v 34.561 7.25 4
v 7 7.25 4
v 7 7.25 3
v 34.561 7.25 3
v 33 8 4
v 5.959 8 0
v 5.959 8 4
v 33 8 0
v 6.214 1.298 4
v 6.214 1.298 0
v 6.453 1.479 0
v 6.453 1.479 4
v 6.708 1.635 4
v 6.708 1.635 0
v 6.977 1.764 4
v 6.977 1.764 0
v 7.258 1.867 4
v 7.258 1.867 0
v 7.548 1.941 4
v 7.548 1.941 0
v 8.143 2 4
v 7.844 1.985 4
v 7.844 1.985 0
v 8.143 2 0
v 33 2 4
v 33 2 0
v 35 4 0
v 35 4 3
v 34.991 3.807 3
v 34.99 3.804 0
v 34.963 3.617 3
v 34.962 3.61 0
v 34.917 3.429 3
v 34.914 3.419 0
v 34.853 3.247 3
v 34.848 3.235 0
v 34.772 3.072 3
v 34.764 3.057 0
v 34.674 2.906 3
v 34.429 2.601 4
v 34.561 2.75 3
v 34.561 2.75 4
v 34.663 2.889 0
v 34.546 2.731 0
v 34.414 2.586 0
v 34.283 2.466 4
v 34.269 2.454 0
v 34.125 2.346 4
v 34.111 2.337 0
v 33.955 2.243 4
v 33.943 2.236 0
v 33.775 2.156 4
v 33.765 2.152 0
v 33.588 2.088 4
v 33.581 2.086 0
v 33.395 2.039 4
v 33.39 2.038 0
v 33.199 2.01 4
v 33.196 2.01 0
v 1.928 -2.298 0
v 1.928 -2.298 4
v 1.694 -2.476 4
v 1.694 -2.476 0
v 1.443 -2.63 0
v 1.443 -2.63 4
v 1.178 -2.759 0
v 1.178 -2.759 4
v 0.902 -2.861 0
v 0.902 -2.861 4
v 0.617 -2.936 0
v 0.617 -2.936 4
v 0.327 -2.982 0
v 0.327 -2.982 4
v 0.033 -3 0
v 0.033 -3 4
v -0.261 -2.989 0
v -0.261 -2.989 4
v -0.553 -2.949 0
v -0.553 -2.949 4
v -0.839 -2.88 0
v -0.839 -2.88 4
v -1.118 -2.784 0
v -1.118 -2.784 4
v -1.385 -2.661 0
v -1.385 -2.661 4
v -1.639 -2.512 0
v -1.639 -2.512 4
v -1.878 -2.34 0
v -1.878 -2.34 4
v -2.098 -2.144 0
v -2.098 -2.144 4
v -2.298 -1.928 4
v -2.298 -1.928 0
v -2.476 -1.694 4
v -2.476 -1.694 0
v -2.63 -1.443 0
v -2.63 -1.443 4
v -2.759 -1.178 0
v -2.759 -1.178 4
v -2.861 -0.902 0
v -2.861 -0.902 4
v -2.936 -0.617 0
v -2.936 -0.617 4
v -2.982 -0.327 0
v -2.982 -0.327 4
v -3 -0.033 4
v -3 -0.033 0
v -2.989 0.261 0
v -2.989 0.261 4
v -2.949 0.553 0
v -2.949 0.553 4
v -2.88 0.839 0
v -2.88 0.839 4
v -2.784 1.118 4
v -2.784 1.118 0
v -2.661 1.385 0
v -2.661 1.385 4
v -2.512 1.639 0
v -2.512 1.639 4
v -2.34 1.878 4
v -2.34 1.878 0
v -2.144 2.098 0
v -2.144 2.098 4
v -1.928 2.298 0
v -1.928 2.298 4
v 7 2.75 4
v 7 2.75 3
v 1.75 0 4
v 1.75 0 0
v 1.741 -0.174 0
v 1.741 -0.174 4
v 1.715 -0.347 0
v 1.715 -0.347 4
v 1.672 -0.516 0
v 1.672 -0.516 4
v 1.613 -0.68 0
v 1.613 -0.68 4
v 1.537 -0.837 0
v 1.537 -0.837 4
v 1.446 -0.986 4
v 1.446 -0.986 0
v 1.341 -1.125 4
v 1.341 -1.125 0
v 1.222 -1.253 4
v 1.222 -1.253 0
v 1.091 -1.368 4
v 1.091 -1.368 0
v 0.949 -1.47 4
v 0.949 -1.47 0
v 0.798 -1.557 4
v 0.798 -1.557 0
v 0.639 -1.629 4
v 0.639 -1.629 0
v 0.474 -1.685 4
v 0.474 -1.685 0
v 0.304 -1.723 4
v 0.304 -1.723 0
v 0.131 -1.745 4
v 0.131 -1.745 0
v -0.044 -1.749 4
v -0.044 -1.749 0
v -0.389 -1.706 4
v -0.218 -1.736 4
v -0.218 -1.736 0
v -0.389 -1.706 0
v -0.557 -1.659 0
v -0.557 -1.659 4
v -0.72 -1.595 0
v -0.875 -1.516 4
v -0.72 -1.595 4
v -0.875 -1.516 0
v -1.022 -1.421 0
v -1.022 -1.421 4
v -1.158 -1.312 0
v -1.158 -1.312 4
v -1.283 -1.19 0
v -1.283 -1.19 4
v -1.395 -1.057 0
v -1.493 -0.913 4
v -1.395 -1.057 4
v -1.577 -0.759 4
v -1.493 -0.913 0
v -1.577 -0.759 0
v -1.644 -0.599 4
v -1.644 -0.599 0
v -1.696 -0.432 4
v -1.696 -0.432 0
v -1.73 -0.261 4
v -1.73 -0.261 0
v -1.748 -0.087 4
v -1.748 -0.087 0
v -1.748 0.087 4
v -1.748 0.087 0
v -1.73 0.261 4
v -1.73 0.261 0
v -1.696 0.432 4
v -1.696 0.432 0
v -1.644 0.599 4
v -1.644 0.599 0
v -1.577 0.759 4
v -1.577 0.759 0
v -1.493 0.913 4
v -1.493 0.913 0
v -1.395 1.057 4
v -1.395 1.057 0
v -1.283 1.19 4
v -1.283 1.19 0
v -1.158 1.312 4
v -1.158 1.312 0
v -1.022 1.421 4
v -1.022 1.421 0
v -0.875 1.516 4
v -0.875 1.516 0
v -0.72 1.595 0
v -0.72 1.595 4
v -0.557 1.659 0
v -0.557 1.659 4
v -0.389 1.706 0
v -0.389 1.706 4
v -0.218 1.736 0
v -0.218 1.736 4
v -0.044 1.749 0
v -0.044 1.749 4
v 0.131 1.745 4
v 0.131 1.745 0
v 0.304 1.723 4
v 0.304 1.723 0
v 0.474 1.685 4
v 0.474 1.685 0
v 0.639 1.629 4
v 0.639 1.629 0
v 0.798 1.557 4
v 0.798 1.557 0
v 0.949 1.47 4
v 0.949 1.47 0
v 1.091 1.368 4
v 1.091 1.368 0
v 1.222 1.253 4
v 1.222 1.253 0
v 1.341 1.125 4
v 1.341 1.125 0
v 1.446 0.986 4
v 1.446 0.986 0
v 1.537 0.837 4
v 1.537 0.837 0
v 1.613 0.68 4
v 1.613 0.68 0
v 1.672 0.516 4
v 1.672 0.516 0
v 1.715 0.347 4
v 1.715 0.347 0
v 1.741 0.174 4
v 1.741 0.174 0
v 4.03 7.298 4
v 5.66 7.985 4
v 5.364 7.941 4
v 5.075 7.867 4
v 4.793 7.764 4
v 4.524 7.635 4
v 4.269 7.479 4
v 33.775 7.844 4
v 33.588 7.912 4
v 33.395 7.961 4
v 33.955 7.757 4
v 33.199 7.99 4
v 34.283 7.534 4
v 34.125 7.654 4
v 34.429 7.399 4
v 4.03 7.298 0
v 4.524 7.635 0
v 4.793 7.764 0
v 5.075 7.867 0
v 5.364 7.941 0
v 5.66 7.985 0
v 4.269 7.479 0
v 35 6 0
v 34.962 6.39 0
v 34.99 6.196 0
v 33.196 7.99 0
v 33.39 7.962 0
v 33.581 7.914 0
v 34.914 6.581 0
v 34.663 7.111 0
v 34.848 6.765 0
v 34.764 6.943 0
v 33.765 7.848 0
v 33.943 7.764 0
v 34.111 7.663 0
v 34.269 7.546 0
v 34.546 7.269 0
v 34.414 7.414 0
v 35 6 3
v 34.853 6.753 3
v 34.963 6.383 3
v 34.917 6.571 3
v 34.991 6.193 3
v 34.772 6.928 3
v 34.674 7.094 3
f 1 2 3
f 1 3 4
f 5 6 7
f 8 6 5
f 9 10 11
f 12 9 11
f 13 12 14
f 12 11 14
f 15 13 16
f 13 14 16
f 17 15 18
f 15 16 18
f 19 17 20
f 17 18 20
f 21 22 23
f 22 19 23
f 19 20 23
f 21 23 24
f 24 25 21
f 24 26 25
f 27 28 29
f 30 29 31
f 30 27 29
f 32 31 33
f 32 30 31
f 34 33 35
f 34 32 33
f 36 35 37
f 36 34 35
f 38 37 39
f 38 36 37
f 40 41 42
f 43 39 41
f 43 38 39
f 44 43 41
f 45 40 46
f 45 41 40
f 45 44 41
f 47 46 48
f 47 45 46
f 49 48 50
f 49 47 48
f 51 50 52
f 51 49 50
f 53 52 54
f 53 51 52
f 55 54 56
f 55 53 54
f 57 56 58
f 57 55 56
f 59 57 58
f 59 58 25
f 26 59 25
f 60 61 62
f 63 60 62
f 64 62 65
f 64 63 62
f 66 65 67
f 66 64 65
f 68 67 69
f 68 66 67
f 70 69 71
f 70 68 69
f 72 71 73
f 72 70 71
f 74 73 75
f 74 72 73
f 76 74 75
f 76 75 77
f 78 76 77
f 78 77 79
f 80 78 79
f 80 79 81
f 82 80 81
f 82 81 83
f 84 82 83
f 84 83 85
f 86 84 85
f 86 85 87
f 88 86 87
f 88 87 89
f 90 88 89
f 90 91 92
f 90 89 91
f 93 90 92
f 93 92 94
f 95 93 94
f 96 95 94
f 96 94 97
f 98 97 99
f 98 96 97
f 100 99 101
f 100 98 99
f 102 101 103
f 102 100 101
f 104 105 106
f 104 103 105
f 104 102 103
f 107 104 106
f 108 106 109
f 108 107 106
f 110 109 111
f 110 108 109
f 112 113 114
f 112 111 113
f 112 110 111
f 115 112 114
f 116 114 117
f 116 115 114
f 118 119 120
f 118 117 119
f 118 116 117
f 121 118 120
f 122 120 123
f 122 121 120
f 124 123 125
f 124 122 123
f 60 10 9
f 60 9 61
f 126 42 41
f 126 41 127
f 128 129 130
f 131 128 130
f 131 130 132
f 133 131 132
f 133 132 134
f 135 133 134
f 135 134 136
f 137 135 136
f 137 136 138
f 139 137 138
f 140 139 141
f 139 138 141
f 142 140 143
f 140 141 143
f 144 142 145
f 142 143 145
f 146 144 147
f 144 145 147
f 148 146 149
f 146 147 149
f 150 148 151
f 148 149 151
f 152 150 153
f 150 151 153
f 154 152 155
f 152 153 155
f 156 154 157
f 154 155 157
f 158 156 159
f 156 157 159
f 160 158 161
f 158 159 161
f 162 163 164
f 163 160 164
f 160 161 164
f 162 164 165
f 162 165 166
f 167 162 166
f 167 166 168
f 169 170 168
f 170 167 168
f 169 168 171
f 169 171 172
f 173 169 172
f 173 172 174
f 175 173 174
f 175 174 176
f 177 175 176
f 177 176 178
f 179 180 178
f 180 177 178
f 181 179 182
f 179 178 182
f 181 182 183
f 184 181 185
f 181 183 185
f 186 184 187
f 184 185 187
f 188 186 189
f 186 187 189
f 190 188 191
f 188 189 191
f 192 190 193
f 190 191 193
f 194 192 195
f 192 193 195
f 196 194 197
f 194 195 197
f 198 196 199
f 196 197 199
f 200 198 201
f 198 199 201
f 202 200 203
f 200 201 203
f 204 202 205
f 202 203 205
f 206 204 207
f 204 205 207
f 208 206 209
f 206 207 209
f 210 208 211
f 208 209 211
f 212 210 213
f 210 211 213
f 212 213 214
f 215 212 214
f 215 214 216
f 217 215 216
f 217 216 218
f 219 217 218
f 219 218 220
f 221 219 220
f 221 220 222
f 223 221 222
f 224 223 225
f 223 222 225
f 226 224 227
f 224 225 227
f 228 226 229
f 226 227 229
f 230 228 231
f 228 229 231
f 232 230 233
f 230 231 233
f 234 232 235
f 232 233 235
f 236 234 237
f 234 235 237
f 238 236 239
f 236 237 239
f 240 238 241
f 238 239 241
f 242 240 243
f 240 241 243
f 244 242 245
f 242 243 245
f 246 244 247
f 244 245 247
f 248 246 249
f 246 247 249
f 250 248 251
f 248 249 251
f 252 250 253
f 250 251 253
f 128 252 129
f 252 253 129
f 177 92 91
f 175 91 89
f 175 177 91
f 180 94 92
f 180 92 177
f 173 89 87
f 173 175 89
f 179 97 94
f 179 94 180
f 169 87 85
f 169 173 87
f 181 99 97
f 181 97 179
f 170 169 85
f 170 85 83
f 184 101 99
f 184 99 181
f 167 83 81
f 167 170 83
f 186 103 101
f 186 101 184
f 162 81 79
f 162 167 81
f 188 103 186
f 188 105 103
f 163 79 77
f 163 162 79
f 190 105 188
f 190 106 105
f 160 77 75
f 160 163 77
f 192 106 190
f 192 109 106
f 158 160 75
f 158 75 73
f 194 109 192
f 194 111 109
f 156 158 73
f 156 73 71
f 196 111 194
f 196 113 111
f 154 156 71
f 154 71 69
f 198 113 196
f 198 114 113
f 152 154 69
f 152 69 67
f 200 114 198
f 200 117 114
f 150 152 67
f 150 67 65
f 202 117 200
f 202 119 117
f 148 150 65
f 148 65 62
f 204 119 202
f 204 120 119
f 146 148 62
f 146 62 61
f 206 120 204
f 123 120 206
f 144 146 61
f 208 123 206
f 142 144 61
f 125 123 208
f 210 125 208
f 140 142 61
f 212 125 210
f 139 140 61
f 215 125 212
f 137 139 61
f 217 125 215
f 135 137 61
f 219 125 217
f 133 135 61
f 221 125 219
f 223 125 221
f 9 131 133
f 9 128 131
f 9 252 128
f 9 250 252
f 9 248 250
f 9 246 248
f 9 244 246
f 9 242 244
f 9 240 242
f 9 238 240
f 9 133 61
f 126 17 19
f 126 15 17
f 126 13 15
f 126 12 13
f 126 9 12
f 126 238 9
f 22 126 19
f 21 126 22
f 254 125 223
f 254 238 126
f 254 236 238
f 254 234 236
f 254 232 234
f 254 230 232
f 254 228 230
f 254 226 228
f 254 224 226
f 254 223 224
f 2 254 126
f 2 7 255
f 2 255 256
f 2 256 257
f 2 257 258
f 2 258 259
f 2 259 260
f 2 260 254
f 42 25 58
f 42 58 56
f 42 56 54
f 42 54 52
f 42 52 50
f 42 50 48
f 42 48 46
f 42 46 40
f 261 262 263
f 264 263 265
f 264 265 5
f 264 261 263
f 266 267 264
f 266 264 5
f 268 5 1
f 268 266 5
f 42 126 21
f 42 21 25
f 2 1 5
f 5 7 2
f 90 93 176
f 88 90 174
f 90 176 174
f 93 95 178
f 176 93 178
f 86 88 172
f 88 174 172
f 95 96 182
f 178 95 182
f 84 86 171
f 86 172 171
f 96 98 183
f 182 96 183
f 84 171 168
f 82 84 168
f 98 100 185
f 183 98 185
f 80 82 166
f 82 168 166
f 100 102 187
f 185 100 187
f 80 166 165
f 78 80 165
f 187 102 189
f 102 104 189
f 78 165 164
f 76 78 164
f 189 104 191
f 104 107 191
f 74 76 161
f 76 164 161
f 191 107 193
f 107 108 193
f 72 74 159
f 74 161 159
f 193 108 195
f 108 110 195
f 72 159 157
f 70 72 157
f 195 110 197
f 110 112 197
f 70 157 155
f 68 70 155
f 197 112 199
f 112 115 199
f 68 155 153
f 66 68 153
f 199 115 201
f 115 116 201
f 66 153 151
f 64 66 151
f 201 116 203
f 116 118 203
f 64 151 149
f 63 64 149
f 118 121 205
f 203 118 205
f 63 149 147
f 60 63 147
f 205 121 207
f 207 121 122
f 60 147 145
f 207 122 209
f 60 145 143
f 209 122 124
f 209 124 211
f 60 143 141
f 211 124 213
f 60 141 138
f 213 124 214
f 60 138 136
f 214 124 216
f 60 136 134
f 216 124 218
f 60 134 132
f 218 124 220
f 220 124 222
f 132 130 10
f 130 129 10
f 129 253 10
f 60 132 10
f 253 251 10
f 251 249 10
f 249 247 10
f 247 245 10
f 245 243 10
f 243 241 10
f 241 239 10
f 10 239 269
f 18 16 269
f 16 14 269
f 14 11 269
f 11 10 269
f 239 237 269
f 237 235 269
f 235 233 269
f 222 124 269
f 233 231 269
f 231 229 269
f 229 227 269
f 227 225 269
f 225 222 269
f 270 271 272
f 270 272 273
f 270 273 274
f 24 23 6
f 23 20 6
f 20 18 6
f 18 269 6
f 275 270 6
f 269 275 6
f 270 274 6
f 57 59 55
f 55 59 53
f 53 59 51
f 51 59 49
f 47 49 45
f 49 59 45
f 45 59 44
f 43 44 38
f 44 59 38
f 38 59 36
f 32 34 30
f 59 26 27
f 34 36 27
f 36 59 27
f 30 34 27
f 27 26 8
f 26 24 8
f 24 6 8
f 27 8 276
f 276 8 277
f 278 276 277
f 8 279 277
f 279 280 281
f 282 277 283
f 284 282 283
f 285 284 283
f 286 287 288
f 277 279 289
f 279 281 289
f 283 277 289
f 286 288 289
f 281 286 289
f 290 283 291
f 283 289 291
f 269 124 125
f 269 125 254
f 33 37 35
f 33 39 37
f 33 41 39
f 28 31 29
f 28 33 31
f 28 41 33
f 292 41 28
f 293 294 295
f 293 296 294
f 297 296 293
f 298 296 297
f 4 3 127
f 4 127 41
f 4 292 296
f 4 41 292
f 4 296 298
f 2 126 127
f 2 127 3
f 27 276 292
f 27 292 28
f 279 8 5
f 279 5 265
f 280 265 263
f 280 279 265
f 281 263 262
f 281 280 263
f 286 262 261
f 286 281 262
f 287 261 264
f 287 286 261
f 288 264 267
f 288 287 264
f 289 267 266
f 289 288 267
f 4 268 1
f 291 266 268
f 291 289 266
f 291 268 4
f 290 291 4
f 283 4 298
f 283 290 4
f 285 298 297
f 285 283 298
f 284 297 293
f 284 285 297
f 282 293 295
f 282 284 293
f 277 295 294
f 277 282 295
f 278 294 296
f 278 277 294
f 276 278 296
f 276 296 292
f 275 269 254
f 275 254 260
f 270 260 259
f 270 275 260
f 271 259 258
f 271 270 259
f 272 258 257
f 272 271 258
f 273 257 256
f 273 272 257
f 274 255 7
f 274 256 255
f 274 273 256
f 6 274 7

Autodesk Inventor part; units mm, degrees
ref_plane "YZ Plane" through (0, 0, 0) normal (1, 0, 0) x (0, 1, 0)
ref_plane "XZ Plane" through (0, 0, 0) normal (0, 1, 0) x (-1, 0, 0)
ref_plane "XY Plane" through (0, 0, 0) normal (0, 0, 1) x (1, 0, 0)
sketch "Sketch1" plane through (0, 0, 0) normal (0, 0, 1) x (1, 0, 0)
  circle A0 centre (0, 0) radius 3
  line L0 (-1.9284, 2.2981) -> (4.0304, 7.2981)
  line L1 (5.9588, 8) -> (33, 8)
  line L2 (35, 6) -> (35, 4)
  line L3 (33, 2) -> (8.1426, 2)
  line L4 (6.2142, 1.2981) -> (1.9284, -2.2981)
  arc A1 (5.9588, 8) -> (4.0304, 7.2981) centre (5.9588, 5) ccw
  arc A2 (8.1426, 2) -> (6.2142, 1.2981) centre (8.1426, -1) ccw
  arc A3 (35, 6) -> (33, 8) centre (33, 6) ccw
  arc A4 (33, 2) -> (35, 4) centre (33, 4) ccw
  circle A5 centre (0, 0) radius 1.75
  point P0 (35, 8)
  point P1 (35, 2)
  dimension "d0" = 6
  dimension "d1" = 6
  dimension "d2" = 3
  dimension "d3" = 140
  dimension "d4" = 2
  dimension "d5" = 2
  dimension "d6" = 35
  dimension "d7" = 3.5
extrude "Extrusion1" add sketch "Sketch1" along normal blind 4
sketch "Sketch2" plane through (0, 0, 4) normal (0, 0, 1) x (1, 0, 0)
  line L0 (63, 2.75) -> (7, 2.75)
  line L1 (7, 2.75) -> (7, 7.25)
  line L2 (7, 7.25) -> (63, 7.25)
  line L3 (63, 7.25) -> (63, 2.75)
  line L4 (35, 4) -> (35, 6) projected
  line L5 (63, 2.75) -> (7, 7.25) construction
  line L6 (7, 2.75) -> (63, 7.25) construction
  point P0 (0, 0)
  point P1 (35, 5)
  dimension "d10" = 4.5
  dimension "d11" = 28
extrude "Extrusion2" cut sketch "Sketch2" against normal blind 1
equation "\"d1\" = d0"
properties part number "espcam-mount-2a"
